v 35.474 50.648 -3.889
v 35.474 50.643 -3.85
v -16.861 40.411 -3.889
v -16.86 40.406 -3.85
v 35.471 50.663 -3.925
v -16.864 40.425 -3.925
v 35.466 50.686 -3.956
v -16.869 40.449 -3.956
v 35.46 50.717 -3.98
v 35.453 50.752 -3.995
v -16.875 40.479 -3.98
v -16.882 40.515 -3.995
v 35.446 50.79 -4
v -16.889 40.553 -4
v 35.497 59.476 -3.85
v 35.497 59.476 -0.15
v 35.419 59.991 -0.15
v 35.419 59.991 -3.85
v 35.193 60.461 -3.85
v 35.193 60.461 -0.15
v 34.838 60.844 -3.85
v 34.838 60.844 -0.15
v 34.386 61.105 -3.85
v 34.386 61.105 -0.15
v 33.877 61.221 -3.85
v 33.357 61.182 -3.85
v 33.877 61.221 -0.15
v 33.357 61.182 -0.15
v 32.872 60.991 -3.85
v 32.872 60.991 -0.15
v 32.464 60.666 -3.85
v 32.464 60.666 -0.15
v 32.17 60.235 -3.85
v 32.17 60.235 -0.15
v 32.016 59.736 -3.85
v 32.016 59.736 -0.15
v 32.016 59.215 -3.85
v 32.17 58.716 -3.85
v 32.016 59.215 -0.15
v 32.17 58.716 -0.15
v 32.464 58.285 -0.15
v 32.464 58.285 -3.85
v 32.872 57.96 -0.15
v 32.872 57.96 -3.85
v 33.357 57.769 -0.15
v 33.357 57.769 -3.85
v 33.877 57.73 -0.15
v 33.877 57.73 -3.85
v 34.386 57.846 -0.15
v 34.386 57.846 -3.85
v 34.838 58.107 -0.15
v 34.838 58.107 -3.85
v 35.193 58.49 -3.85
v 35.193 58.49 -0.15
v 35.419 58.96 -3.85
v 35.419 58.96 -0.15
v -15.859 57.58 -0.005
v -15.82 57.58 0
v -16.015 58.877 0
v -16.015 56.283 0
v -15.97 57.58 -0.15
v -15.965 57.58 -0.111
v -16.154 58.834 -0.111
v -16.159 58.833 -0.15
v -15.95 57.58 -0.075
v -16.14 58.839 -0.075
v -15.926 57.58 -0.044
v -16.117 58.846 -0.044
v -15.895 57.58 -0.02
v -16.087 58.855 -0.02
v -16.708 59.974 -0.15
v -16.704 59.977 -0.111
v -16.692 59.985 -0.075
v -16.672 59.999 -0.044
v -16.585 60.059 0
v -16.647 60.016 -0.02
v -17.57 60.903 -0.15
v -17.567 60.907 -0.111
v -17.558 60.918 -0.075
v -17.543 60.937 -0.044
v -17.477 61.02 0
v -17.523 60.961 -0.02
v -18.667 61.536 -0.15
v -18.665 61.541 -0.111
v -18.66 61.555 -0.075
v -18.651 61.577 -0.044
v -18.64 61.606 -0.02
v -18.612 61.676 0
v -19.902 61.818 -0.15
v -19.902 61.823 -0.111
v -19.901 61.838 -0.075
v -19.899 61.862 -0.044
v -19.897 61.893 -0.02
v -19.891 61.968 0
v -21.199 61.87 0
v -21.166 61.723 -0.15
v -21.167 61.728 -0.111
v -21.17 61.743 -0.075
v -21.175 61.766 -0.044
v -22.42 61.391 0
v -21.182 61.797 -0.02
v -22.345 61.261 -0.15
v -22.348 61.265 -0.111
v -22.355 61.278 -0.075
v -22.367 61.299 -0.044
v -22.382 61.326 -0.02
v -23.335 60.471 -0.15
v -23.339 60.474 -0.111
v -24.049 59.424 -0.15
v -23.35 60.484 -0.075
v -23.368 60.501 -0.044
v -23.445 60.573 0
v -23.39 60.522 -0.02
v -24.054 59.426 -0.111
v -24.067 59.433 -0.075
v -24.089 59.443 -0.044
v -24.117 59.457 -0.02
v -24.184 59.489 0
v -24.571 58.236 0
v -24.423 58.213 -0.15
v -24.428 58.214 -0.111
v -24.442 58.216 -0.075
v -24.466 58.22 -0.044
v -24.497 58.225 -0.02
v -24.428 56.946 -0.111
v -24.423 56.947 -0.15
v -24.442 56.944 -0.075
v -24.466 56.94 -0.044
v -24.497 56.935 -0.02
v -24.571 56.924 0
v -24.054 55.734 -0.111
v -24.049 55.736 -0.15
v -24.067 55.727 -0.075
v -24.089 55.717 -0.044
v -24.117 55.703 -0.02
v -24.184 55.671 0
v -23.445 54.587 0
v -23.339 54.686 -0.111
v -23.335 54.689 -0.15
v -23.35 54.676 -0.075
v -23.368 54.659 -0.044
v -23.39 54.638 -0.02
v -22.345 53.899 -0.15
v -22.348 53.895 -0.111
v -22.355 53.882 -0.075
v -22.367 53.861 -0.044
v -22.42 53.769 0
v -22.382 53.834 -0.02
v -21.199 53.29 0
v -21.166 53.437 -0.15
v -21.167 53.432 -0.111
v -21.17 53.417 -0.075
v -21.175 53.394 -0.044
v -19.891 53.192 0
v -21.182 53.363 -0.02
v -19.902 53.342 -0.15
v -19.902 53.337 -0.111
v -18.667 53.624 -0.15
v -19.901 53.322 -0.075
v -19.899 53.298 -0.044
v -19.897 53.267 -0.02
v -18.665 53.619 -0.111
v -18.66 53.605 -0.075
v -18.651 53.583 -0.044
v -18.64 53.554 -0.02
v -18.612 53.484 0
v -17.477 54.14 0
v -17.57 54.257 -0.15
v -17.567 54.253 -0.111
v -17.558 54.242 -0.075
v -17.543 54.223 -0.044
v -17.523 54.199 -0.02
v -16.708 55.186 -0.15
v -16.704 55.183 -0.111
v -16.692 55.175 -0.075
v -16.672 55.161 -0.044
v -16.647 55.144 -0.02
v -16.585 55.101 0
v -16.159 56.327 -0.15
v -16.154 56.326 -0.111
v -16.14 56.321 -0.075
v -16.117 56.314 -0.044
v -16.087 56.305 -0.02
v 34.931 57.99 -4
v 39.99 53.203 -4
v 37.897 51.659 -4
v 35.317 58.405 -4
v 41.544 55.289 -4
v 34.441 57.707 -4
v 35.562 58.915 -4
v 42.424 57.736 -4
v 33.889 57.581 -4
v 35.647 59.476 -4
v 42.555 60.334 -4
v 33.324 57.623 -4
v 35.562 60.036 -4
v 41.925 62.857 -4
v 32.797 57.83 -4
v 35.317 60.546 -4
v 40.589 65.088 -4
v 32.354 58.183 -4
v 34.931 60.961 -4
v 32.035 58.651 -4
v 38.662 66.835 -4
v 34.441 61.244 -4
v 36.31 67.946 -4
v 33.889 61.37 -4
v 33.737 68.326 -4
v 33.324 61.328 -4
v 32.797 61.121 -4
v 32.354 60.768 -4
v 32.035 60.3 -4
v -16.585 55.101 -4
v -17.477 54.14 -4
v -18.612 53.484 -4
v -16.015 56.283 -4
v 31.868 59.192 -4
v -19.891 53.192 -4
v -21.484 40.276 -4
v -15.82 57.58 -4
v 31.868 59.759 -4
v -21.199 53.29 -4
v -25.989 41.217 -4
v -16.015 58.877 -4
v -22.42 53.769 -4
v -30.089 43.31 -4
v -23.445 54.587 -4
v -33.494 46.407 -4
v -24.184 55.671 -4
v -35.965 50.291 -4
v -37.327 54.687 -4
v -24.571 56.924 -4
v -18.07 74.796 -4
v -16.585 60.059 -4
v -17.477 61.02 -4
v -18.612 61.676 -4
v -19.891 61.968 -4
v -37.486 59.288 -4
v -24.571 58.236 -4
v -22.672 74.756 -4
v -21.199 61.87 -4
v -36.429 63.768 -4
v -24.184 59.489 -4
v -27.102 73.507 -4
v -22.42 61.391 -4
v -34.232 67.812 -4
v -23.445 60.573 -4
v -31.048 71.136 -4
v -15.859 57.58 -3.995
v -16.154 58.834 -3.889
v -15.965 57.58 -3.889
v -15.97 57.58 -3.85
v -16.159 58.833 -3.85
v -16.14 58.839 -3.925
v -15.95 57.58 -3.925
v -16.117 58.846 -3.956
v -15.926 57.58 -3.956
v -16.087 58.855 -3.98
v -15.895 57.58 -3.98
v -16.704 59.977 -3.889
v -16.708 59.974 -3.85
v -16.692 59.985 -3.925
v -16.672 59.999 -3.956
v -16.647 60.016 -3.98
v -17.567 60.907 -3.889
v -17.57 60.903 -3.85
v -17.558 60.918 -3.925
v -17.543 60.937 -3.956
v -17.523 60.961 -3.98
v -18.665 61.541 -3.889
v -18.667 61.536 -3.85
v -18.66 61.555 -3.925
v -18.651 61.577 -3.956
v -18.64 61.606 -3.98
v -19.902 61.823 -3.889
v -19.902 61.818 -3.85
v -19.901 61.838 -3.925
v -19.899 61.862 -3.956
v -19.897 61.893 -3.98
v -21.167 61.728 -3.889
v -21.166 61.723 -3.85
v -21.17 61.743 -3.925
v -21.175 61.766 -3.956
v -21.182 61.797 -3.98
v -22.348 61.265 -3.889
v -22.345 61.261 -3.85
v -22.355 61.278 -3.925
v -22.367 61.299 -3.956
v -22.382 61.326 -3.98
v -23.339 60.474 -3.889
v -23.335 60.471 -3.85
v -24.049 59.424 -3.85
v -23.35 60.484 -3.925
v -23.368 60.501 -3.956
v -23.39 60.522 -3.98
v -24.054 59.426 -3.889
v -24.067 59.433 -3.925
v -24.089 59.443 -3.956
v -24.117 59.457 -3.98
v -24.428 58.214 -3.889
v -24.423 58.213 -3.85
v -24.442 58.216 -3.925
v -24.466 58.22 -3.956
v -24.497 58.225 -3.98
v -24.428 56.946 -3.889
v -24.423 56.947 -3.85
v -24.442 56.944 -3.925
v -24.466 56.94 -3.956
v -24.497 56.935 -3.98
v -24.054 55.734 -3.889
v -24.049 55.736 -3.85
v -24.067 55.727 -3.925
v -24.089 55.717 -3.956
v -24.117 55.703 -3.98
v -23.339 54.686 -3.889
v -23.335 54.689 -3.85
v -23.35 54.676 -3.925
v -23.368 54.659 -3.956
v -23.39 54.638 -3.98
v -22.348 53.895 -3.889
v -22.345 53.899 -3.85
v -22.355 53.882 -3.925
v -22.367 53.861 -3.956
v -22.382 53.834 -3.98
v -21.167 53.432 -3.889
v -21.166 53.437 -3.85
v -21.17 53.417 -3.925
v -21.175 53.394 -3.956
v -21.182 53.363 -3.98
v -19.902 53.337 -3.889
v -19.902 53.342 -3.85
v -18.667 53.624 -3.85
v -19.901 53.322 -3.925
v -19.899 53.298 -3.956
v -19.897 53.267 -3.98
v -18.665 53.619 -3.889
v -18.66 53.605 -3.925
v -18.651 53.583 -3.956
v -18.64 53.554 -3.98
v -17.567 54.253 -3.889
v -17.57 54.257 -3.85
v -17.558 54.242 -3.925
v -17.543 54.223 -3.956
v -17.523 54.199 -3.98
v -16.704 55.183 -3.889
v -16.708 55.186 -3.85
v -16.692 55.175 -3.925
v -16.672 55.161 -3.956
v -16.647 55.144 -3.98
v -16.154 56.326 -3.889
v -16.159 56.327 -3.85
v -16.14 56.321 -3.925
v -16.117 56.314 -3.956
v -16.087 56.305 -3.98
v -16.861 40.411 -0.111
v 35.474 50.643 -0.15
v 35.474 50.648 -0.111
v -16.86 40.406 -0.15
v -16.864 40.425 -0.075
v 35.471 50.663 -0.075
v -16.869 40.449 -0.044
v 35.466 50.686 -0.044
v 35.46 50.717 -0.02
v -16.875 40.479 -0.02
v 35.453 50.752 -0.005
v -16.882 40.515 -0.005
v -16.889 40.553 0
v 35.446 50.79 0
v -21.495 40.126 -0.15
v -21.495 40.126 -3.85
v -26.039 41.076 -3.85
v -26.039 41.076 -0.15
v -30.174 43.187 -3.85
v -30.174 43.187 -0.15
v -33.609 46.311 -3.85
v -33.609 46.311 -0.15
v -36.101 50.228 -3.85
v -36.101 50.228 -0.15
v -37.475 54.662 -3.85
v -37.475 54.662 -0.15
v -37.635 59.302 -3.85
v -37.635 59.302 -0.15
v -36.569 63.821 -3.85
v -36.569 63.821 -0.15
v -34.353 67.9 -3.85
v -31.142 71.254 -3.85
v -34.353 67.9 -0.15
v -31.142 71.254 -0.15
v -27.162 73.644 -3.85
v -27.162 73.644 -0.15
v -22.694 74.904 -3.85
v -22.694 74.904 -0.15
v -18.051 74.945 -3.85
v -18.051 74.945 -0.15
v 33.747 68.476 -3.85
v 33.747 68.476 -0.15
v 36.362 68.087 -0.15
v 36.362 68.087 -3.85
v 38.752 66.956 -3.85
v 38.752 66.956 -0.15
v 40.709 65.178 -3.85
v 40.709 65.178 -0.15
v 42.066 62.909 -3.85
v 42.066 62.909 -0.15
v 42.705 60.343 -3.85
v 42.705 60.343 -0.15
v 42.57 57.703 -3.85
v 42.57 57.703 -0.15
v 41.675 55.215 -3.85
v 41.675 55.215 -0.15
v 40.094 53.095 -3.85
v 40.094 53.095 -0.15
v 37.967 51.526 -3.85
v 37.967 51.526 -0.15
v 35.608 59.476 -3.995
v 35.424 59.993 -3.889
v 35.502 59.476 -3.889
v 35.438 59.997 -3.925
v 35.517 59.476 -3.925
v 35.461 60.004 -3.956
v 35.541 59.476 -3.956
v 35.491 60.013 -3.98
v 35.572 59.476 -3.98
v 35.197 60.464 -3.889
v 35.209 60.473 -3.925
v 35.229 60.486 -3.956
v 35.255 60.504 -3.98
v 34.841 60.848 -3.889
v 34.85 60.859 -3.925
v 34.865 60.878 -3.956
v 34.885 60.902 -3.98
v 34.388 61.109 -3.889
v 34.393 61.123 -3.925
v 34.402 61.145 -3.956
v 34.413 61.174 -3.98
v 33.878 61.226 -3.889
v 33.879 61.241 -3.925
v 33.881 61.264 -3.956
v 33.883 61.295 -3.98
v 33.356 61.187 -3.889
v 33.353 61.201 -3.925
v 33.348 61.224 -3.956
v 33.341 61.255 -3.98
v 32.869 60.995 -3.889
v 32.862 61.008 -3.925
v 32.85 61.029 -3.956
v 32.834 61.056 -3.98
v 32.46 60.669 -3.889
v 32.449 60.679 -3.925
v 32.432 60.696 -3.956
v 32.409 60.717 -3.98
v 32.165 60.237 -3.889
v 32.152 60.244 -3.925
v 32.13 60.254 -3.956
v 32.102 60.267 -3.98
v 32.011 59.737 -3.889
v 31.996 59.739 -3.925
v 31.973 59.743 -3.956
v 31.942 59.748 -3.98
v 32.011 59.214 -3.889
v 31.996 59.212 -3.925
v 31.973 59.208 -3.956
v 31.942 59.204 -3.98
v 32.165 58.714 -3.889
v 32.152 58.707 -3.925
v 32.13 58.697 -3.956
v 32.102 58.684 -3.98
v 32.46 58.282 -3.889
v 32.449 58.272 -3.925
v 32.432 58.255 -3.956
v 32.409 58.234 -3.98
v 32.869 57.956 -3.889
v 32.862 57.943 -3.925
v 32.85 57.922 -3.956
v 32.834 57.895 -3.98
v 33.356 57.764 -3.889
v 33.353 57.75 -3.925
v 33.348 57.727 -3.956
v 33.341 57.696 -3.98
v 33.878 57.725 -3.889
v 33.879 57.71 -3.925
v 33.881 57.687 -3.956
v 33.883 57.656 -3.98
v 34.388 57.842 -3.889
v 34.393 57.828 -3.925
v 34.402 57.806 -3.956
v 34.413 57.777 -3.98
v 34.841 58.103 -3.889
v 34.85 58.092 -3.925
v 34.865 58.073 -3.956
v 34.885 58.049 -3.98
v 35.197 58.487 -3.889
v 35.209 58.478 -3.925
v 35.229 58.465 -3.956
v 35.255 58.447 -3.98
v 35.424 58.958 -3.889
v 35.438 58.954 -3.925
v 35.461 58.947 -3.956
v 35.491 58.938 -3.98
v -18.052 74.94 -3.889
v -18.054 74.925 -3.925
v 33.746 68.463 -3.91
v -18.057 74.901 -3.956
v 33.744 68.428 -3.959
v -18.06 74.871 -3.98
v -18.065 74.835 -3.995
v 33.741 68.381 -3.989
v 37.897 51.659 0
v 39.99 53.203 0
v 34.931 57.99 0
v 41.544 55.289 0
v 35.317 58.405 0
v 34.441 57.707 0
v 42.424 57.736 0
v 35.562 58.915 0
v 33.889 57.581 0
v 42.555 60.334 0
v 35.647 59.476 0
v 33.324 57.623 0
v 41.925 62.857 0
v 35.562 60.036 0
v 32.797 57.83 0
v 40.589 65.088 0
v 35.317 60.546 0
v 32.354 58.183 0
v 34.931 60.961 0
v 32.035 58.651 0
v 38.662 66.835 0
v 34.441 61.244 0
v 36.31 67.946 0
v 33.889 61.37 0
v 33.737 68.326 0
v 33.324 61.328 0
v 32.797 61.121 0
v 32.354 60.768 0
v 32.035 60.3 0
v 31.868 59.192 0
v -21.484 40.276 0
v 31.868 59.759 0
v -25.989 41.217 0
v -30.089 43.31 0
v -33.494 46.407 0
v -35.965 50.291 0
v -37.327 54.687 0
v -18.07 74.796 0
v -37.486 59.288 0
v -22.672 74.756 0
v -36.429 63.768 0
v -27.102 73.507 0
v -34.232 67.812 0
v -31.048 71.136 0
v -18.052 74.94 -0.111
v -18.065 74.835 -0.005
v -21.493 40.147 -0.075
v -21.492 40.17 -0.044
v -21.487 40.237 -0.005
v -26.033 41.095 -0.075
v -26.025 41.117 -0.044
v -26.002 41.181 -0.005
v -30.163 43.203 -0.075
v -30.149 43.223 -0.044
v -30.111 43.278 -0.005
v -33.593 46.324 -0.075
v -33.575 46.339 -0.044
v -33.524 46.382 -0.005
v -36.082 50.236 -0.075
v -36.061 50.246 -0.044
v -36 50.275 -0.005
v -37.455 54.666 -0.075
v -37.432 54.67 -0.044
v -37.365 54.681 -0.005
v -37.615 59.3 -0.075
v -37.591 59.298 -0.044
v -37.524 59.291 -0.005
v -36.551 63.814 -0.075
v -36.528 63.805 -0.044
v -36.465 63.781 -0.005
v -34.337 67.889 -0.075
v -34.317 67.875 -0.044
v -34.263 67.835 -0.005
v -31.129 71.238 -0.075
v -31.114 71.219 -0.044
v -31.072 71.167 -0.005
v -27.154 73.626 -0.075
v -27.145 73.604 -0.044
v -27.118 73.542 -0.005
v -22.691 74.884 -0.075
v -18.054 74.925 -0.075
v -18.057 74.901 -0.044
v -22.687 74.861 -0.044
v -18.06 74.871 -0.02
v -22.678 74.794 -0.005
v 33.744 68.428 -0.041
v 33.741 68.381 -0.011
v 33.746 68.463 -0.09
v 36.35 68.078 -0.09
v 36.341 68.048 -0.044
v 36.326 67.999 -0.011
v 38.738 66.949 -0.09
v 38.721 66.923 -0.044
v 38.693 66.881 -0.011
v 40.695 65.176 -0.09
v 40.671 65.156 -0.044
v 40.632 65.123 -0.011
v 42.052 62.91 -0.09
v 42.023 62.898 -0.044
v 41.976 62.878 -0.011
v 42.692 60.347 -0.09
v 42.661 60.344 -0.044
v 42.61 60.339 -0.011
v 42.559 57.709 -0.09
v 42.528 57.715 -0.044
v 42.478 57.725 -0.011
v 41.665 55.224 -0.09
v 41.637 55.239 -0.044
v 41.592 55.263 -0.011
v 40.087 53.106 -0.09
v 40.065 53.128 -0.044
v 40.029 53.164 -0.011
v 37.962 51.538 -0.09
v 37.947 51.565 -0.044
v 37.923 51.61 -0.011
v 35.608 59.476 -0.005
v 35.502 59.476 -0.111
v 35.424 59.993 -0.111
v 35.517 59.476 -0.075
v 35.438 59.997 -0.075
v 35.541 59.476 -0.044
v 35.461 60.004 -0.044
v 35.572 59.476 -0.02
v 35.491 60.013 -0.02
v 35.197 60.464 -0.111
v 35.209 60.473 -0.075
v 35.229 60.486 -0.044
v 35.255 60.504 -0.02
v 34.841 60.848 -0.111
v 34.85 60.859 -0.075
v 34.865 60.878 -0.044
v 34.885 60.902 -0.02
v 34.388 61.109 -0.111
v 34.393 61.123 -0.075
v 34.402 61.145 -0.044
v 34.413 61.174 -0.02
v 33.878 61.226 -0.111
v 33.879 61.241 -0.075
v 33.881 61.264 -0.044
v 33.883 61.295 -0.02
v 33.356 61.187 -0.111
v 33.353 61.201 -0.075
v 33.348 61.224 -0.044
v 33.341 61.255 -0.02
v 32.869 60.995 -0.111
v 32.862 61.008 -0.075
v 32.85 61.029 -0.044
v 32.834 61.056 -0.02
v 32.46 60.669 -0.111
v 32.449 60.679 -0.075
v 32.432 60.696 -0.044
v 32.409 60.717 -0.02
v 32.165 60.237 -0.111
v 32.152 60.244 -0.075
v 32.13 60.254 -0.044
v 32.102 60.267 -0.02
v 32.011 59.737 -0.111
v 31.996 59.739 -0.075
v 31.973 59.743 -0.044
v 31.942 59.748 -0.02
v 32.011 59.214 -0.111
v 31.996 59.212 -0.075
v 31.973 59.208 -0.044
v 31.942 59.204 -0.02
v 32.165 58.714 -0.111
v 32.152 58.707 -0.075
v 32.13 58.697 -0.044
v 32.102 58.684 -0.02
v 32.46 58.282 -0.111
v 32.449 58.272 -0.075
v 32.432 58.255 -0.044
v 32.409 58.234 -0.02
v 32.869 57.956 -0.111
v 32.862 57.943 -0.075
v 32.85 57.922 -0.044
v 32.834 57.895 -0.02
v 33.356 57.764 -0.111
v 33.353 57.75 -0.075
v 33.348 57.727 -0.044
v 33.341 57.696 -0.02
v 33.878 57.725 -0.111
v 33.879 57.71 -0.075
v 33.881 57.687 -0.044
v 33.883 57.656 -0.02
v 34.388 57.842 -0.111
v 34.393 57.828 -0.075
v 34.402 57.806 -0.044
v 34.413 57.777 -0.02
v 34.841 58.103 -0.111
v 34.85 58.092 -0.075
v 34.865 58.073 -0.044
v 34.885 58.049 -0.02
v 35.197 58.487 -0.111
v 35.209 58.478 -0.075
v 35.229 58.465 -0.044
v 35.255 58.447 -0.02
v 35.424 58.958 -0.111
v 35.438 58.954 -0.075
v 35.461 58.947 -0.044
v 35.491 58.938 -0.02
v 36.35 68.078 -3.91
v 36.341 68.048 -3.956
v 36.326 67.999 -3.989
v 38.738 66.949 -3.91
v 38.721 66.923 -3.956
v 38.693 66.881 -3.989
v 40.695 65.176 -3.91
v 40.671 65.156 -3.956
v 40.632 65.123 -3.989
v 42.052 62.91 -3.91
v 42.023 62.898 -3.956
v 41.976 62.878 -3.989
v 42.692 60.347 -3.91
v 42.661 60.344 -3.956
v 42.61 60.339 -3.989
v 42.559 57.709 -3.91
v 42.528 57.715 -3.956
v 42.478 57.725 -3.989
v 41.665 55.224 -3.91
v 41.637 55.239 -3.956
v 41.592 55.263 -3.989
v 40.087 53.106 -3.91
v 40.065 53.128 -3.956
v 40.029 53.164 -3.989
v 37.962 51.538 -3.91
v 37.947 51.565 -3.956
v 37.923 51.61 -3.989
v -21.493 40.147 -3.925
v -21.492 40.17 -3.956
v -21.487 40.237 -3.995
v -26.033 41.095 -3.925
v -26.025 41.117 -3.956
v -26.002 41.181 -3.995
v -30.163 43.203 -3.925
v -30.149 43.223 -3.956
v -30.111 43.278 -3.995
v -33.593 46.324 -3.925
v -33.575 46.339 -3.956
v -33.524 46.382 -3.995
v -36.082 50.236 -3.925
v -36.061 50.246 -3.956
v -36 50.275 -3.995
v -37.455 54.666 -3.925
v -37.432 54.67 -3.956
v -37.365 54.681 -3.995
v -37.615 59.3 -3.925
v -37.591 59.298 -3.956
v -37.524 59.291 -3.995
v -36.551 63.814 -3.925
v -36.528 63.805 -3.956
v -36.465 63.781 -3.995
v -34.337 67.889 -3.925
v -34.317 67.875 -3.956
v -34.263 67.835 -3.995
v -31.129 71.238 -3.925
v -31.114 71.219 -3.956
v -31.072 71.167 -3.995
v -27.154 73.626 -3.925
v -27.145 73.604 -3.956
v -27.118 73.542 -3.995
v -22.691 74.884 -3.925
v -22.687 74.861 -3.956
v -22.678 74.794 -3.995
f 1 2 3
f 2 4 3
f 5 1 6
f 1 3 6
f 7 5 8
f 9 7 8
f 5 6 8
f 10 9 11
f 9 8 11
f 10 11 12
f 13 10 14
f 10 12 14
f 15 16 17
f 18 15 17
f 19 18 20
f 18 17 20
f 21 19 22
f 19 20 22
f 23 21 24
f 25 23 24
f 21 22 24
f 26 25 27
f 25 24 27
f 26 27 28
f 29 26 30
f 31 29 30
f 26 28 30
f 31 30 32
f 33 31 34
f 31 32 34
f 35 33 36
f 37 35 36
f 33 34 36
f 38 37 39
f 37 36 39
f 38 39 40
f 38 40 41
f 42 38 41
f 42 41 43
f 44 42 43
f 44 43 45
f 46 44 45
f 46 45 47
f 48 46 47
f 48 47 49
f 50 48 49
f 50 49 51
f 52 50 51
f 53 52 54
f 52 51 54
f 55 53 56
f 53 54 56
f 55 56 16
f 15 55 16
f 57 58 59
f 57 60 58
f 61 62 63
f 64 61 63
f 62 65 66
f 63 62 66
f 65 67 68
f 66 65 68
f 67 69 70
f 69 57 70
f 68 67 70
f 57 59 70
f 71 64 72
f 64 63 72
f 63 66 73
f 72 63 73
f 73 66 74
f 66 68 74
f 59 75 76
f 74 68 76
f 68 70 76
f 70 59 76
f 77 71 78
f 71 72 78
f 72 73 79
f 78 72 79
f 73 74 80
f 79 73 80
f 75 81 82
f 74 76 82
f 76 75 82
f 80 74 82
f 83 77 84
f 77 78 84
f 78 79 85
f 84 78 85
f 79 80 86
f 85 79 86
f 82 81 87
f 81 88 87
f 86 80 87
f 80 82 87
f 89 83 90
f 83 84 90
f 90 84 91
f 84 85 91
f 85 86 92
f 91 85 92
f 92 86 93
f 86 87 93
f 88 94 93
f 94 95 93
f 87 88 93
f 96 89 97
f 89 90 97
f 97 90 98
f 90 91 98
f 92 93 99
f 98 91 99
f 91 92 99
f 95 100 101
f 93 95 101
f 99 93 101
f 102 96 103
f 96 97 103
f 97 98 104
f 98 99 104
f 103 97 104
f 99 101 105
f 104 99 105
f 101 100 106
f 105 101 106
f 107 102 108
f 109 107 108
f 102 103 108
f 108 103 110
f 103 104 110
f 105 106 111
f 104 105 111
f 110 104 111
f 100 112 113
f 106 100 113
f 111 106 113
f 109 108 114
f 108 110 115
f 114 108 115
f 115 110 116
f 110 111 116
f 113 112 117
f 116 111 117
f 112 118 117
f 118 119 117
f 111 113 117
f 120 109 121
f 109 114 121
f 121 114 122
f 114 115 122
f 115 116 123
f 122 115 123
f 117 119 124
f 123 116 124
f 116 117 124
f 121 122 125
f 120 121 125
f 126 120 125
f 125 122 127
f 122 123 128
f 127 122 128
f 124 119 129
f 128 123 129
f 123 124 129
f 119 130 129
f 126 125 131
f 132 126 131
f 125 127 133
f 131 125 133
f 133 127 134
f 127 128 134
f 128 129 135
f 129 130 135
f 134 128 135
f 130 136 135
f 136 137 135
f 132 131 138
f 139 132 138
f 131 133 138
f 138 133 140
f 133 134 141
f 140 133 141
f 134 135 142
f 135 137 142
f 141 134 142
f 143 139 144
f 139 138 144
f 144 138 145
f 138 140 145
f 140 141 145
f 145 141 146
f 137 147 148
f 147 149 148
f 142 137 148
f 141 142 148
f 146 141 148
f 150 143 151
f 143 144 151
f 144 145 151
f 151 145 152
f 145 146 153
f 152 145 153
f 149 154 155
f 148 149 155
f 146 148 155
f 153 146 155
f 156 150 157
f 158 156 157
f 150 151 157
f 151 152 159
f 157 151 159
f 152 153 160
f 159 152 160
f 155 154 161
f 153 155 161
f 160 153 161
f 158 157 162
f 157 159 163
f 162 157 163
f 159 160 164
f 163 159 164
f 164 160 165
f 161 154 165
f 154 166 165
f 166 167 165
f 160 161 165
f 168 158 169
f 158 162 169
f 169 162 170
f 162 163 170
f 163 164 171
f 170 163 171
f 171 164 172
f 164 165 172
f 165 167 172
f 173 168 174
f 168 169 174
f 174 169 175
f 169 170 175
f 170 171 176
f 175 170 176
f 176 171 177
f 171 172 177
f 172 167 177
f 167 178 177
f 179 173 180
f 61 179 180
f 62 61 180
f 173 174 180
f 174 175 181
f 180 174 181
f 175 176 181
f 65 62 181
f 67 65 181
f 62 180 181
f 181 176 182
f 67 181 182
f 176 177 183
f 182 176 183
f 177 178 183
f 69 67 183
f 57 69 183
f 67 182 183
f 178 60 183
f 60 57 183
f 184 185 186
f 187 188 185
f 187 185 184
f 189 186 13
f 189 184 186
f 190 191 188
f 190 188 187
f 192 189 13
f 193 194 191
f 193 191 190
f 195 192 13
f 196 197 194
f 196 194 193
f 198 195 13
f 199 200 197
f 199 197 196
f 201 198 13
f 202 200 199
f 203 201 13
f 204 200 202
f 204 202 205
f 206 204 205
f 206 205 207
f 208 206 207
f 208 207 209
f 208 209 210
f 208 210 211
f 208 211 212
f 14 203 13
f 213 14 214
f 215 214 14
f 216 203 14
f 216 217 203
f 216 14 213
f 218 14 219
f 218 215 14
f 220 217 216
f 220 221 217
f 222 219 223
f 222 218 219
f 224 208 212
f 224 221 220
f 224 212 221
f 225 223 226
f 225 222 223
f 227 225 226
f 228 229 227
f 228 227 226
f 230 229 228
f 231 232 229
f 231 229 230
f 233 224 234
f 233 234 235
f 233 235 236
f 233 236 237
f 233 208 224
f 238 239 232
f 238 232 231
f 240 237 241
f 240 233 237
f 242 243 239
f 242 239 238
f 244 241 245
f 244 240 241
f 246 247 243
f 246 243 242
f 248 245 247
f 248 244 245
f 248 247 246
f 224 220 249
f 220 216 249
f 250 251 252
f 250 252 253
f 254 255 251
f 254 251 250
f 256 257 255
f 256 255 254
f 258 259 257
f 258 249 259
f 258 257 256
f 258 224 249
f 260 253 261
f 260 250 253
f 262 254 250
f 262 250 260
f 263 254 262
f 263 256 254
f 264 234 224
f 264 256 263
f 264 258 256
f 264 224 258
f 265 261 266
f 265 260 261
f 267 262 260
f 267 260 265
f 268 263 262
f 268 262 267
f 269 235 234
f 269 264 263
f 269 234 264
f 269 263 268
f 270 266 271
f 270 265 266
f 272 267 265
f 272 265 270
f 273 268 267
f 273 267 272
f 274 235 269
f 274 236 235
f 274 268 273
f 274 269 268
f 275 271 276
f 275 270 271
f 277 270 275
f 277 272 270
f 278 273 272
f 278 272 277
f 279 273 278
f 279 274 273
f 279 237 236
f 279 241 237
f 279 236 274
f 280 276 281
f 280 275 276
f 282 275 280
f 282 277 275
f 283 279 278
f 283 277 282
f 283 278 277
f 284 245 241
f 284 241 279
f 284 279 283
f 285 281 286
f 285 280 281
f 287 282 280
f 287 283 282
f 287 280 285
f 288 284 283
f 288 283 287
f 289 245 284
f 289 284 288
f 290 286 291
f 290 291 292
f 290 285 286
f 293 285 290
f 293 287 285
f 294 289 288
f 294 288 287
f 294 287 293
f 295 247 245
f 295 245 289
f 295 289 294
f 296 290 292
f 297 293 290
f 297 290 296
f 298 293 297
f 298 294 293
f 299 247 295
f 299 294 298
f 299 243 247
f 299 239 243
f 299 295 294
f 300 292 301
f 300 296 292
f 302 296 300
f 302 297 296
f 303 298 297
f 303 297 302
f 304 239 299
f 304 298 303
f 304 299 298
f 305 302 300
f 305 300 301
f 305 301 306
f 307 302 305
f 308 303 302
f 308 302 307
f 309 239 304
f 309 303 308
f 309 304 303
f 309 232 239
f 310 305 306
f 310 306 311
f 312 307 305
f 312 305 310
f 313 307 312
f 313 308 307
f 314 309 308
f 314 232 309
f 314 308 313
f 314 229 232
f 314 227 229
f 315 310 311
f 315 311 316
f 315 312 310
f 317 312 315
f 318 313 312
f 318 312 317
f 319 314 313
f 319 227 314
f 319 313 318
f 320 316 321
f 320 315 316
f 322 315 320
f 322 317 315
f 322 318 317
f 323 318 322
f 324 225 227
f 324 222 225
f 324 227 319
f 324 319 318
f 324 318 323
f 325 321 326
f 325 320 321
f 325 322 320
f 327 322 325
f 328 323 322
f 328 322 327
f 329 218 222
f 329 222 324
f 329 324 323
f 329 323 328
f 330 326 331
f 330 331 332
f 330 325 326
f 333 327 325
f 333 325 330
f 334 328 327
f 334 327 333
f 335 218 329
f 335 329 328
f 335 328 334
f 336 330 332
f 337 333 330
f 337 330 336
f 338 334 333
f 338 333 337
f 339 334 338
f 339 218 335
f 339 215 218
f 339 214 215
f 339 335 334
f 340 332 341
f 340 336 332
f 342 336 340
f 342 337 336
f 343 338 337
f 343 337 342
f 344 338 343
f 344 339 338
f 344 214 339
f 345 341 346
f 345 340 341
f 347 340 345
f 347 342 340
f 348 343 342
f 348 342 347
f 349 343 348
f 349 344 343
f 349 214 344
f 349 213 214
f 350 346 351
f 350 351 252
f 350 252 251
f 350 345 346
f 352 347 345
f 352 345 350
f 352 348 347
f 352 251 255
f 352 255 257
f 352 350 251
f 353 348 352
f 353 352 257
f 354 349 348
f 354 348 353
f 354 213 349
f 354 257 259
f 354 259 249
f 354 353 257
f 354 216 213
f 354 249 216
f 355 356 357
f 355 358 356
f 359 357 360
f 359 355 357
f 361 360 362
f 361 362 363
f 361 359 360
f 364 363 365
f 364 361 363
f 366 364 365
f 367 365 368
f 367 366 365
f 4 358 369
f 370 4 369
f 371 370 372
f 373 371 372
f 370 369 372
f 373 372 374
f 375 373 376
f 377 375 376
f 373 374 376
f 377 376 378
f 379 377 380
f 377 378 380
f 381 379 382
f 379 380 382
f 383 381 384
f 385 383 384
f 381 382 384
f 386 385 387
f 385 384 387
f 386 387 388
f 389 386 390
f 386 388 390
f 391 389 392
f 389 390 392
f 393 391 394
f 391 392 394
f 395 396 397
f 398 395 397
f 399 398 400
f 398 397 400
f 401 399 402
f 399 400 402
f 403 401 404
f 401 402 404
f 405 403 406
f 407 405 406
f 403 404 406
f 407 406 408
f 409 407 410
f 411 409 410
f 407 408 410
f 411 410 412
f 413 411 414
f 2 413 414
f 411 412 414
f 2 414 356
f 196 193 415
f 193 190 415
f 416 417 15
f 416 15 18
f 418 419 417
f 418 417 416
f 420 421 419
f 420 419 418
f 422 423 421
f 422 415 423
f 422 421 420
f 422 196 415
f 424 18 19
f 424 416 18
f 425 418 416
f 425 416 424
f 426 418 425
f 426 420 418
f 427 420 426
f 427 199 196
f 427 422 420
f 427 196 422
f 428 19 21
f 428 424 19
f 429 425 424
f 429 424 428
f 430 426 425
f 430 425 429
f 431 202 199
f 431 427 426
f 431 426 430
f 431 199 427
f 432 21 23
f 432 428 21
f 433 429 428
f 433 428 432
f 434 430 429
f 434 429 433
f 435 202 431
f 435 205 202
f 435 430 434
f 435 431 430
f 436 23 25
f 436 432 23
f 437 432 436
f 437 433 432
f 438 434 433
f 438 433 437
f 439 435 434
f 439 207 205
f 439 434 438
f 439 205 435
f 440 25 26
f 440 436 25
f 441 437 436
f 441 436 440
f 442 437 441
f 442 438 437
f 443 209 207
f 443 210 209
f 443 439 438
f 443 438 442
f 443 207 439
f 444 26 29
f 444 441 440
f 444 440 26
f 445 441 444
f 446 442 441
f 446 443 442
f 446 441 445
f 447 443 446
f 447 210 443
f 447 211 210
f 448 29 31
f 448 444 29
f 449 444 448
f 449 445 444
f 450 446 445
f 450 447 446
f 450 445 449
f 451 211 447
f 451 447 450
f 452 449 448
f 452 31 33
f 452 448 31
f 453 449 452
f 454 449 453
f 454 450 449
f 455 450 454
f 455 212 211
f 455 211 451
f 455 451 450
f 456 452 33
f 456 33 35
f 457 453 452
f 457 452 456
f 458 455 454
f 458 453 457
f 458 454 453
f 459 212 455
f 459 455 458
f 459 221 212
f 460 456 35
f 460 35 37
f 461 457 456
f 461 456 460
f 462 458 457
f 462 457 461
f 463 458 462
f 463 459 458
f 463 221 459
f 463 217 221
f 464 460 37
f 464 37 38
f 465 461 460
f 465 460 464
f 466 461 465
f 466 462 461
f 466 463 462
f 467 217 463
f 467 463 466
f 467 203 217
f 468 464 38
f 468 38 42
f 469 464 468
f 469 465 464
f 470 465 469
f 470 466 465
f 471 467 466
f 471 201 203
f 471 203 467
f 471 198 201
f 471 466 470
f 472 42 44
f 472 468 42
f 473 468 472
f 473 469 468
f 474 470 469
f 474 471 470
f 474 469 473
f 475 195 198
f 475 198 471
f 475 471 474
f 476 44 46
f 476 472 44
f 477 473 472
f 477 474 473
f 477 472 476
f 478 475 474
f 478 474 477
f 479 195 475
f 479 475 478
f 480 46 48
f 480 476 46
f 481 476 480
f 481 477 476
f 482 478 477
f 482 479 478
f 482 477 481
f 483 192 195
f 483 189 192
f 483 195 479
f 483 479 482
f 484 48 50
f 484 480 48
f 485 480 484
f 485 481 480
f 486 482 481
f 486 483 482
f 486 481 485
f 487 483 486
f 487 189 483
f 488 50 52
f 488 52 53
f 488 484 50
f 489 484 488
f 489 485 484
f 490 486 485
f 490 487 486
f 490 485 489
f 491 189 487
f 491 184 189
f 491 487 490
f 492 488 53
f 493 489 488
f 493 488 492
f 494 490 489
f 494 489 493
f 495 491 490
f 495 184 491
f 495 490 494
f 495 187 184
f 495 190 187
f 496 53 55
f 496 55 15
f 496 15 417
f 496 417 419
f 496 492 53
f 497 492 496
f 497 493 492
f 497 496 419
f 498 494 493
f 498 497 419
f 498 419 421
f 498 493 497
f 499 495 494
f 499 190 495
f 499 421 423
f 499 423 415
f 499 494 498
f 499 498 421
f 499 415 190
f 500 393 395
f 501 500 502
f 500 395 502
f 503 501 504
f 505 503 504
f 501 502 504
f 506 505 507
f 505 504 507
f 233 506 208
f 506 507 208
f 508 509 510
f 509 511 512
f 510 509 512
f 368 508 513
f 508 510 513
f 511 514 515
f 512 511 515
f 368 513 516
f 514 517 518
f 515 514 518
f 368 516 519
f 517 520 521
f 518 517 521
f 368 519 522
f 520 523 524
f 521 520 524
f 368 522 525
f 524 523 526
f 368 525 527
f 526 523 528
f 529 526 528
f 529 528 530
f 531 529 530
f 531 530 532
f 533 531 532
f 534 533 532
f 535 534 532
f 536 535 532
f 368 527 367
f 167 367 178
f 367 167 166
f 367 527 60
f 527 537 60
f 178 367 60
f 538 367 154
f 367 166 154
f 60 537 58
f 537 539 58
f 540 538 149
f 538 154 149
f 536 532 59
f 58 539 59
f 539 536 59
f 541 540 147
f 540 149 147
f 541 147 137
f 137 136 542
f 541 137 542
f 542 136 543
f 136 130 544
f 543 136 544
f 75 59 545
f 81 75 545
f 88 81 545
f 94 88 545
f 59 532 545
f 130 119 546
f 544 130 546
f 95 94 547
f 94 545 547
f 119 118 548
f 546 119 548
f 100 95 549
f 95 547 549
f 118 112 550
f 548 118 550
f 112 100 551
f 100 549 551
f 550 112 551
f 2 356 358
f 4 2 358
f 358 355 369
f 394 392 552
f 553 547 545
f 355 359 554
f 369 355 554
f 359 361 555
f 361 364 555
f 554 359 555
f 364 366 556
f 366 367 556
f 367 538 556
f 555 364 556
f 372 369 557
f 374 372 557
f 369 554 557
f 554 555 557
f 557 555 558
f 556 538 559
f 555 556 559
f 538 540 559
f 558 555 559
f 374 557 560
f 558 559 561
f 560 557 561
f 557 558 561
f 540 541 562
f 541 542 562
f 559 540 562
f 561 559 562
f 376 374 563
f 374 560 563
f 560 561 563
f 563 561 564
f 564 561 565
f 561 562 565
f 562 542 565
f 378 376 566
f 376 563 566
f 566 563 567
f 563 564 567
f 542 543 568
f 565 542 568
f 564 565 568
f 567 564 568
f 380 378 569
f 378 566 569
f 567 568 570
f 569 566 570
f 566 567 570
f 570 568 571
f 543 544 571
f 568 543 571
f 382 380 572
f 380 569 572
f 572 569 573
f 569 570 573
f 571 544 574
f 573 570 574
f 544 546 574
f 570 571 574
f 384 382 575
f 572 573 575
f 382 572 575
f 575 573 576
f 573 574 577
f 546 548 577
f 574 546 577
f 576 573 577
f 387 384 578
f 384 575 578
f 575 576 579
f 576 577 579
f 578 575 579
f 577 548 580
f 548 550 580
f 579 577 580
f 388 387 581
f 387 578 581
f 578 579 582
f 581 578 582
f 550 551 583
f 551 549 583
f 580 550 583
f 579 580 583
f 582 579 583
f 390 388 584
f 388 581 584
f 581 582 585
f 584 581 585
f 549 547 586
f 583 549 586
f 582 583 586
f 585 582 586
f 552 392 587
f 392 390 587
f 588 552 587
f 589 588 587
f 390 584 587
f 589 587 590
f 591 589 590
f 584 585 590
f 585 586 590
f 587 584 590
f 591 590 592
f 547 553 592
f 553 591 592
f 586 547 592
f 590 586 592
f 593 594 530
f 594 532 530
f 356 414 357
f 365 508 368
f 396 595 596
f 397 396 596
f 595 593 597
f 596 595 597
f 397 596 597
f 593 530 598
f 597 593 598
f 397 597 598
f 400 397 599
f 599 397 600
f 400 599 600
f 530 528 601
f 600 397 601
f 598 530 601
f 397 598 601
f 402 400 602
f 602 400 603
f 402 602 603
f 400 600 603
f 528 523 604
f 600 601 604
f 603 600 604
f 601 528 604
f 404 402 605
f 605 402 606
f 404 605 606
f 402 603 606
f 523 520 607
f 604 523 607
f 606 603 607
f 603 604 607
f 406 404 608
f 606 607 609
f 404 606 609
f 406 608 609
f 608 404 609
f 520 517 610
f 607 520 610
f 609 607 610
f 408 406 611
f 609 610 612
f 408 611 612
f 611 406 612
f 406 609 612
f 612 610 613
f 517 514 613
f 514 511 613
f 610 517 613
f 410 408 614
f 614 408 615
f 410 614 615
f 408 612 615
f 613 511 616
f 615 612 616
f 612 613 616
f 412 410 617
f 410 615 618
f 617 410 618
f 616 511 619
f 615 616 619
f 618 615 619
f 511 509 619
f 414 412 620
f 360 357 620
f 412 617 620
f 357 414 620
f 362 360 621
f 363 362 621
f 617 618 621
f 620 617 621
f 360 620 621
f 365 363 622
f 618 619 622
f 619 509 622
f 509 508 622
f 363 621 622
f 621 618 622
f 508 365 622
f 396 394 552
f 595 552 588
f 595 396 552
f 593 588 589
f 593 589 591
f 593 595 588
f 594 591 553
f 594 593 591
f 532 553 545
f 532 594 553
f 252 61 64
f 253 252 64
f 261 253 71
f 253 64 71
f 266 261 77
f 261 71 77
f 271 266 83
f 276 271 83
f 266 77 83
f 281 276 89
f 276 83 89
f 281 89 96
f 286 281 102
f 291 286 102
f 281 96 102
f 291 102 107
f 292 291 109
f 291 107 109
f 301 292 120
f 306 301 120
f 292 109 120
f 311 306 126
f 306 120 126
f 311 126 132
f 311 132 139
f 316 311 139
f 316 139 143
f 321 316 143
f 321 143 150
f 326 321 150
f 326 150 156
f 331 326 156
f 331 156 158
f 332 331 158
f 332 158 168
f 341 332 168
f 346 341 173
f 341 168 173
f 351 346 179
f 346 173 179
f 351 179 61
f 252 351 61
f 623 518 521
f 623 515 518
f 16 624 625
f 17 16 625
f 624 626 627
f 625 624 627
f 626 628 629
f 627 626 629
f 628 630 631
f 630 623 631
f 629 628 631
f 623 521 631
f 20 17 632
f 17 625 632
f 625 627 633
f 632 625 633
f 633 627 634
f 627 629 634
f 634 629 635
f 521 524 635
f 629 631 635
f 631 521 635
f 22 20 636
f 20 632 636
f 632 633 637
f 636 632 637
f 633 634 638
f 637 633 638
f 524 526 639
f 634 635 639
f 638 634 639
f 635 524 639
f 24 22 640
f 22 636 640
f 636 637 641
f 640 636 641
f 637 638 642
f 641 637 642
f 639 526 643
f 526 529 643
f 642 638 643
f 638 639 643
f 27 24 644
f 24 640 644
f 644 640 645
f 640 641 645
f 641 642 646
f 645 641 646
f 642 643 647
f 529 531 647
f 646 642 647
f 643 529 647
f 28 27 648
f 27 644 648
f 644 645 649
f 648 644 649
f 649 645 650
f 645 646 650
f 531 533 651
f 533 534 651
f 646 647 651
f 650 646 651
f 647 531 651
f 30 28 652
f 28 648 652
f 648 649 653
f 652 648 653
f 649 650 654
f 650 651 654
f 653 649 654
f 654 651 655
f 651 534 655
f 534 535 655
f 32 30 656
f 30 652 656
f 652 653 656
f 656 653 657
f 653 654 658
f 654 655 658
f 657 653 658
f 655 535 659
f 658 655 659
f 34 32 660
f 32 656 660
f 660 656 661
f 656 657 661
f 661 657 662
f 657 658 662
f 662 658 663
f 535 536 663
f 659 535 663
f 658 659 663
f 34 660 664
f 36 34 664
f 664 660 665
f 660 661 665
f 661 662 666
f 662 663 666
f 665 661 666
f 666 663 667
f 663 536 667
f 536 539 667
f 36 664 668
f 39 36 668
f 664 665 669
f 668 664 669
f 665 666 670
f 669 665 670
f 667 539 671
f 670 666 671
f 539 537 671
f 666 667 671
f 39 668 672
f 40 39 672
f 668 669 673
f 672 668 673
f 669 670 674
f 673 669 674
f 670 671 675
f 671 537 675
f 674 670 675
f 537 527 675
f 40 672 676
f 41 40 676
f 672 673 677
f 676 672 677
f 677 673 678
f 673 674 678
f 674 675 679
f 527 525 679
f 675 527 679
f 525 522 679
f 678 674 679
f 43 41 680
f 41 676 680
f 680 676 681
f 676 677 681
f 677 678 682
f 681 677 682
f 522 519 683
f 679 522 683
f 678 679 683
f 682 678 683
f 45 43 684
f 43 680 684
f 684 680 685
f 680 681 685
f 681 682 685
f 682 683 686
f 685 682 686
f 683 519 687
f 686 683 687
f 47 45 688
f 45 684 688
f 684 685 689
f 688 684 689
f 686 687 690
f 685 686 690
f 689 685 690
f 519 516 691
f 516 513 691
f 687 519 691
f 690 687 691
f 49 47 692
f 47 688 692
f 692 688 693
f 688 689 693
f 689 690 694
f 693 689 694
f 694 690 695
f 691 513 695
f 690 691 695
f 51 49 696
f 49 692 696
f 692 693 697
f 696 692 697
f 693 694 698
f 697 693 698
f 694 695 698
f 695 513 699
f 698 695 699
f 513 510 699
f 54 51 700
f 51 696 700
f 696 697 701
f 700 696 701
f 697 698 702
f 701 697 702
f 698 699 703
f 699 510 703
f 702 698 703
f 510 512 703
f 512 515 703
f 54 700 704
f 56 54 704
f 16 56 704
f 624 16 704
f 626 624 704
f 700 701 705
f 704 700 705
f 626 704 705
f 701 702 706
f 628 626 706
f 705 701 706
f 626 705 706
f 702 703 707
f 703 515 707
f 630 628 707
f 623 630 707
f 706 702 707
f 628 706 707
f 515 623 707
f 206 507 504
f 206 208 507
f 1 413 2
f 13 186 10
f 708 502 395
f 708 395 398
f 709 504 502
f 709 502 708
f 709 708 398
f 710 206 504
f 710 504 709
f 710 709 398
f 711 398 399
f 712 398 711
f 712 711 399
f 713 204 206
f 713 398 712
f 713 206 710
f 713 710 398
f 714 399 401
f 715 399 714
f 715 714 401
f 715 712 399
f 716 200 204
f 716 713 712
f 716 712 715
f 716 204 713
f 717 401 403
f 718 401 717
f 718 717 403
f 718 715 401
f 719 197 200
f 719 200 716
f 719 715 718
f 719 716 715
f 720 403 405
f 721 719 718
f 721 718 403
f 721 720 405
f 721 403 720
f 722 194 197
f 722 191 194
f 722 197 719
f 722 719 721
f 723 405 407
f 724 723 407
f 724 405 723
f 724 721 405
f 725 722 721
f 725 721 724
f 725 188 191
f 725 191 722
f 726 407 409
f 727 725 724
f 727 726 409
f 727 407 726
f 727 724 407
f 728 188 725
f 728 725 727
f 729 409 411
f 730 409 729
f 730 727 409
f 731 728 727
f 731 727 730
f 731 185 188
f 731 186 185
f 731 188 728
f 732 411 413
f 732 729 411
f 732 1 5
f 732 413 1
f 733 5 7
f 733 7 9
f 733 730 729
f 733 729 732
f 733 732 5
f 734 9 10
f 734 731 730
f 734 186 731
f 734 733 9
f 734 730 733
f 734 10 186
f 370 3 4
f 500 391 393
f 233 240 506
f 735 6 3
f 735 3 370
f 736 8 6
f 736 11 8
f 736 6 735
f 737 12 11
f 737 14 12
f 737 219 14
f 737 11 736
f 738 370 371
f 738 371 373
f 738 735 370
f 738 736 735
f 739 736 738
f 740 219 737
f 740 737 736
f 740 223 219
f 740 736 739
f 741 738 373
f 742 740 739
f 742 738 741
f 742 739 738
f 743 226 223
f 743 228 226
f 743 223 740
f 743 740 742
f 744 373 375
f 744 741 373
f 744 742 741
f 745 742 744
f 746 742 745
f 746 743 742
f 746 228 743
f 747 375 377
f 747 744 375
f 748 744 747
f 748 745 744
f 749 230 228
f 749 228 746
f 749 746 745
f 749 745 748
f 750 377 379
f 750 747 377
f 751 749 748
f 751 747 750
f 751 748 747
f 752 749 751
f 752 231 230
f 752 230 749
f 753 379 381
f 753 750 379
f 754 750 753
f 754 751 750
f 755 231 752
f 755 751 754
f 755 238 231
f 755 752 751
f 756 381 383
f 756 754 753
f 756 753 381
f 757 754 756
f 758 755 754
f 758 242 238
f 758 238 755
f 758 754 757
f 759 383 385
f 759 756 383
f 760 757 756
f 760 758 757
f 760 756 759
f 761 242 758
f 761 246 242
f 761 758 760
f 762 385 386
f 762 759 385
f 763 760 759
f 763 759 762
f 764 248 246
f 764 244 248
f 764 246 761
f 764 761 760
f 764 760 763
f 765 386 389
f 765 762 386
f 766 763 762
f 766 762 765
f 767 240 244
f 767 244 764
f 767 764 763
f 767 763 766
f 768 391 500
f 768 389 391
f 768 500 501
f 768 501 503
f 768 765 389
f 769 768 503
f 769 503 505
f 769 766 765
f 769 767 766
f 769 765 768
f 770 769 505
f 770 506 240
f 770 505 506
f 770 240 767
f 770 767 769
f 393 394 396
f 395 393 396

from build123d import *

# Parameters (mm, degrees)
SKETCH_2_R      = 4.25
SKETCH_2_R_2    = 1.75
EXTRUDE_1_DEPTH = 4
FILLET_1_R      = 0.15


with BuildPart() as part:
    # 草图2 → 凸台-拉伸1 (new body)
    with BuildSketch(Plane.XY):
        with BuildLine():
            Line((-18.051094567, 74.945075561), (33.746721757, 68.475505945))
            ThreePointArc((33.746721757, 68.475505945), (42.704773685, 60.343437773), (35.474494733, 50.642907202))
            Line((35.474494733, 50.642907202), (-16.860441437, 40.405502445))
            ThreePointArc((-16.860441437, 40.405502445), (-37.709611382, 56.977095602), (-18.051094567, 74.945075561))
        make_face()
        with Locations((-20.22, 57.58)):
            Circle(SKETCH_2_R, mode=Mode.SUBTRACT)
        with Locations((33.746721757, 59.475505945)):
            Circle(SKETCH_2_R_2, mode=Mode.SUBTRACT)
    extrude(amount=-EXTRUDE_1_DEPTH)

    # 圆角1
    fillet_1_edges = [part.edges().sort_by_distance(p)[0] for p in [
        (-24.47, 57.58, -4),
        (-24.47, 57.58, 0),
        (42.704773685, 60.343437773, -4),
        (31.996721757, 59.475505945, -4),
        (31.996721757, 59.475505945, 0),
        (7.847813595, 71.710290753, -4),
        (-37.709611382, 56.977095602, -4),
        (7.847813595, 71.710290753, 0),
        (42.704773685, 60.343437773, 0),
        (9.307026648, 45.524204824, 0),
        (-37.709611382, 56.977095602, 0),
        (9.307026648, 45.524204824, -4),
    ]]
    fillet(fillet_1_edges, radius=FILLET_1_R)


solid = part.part
